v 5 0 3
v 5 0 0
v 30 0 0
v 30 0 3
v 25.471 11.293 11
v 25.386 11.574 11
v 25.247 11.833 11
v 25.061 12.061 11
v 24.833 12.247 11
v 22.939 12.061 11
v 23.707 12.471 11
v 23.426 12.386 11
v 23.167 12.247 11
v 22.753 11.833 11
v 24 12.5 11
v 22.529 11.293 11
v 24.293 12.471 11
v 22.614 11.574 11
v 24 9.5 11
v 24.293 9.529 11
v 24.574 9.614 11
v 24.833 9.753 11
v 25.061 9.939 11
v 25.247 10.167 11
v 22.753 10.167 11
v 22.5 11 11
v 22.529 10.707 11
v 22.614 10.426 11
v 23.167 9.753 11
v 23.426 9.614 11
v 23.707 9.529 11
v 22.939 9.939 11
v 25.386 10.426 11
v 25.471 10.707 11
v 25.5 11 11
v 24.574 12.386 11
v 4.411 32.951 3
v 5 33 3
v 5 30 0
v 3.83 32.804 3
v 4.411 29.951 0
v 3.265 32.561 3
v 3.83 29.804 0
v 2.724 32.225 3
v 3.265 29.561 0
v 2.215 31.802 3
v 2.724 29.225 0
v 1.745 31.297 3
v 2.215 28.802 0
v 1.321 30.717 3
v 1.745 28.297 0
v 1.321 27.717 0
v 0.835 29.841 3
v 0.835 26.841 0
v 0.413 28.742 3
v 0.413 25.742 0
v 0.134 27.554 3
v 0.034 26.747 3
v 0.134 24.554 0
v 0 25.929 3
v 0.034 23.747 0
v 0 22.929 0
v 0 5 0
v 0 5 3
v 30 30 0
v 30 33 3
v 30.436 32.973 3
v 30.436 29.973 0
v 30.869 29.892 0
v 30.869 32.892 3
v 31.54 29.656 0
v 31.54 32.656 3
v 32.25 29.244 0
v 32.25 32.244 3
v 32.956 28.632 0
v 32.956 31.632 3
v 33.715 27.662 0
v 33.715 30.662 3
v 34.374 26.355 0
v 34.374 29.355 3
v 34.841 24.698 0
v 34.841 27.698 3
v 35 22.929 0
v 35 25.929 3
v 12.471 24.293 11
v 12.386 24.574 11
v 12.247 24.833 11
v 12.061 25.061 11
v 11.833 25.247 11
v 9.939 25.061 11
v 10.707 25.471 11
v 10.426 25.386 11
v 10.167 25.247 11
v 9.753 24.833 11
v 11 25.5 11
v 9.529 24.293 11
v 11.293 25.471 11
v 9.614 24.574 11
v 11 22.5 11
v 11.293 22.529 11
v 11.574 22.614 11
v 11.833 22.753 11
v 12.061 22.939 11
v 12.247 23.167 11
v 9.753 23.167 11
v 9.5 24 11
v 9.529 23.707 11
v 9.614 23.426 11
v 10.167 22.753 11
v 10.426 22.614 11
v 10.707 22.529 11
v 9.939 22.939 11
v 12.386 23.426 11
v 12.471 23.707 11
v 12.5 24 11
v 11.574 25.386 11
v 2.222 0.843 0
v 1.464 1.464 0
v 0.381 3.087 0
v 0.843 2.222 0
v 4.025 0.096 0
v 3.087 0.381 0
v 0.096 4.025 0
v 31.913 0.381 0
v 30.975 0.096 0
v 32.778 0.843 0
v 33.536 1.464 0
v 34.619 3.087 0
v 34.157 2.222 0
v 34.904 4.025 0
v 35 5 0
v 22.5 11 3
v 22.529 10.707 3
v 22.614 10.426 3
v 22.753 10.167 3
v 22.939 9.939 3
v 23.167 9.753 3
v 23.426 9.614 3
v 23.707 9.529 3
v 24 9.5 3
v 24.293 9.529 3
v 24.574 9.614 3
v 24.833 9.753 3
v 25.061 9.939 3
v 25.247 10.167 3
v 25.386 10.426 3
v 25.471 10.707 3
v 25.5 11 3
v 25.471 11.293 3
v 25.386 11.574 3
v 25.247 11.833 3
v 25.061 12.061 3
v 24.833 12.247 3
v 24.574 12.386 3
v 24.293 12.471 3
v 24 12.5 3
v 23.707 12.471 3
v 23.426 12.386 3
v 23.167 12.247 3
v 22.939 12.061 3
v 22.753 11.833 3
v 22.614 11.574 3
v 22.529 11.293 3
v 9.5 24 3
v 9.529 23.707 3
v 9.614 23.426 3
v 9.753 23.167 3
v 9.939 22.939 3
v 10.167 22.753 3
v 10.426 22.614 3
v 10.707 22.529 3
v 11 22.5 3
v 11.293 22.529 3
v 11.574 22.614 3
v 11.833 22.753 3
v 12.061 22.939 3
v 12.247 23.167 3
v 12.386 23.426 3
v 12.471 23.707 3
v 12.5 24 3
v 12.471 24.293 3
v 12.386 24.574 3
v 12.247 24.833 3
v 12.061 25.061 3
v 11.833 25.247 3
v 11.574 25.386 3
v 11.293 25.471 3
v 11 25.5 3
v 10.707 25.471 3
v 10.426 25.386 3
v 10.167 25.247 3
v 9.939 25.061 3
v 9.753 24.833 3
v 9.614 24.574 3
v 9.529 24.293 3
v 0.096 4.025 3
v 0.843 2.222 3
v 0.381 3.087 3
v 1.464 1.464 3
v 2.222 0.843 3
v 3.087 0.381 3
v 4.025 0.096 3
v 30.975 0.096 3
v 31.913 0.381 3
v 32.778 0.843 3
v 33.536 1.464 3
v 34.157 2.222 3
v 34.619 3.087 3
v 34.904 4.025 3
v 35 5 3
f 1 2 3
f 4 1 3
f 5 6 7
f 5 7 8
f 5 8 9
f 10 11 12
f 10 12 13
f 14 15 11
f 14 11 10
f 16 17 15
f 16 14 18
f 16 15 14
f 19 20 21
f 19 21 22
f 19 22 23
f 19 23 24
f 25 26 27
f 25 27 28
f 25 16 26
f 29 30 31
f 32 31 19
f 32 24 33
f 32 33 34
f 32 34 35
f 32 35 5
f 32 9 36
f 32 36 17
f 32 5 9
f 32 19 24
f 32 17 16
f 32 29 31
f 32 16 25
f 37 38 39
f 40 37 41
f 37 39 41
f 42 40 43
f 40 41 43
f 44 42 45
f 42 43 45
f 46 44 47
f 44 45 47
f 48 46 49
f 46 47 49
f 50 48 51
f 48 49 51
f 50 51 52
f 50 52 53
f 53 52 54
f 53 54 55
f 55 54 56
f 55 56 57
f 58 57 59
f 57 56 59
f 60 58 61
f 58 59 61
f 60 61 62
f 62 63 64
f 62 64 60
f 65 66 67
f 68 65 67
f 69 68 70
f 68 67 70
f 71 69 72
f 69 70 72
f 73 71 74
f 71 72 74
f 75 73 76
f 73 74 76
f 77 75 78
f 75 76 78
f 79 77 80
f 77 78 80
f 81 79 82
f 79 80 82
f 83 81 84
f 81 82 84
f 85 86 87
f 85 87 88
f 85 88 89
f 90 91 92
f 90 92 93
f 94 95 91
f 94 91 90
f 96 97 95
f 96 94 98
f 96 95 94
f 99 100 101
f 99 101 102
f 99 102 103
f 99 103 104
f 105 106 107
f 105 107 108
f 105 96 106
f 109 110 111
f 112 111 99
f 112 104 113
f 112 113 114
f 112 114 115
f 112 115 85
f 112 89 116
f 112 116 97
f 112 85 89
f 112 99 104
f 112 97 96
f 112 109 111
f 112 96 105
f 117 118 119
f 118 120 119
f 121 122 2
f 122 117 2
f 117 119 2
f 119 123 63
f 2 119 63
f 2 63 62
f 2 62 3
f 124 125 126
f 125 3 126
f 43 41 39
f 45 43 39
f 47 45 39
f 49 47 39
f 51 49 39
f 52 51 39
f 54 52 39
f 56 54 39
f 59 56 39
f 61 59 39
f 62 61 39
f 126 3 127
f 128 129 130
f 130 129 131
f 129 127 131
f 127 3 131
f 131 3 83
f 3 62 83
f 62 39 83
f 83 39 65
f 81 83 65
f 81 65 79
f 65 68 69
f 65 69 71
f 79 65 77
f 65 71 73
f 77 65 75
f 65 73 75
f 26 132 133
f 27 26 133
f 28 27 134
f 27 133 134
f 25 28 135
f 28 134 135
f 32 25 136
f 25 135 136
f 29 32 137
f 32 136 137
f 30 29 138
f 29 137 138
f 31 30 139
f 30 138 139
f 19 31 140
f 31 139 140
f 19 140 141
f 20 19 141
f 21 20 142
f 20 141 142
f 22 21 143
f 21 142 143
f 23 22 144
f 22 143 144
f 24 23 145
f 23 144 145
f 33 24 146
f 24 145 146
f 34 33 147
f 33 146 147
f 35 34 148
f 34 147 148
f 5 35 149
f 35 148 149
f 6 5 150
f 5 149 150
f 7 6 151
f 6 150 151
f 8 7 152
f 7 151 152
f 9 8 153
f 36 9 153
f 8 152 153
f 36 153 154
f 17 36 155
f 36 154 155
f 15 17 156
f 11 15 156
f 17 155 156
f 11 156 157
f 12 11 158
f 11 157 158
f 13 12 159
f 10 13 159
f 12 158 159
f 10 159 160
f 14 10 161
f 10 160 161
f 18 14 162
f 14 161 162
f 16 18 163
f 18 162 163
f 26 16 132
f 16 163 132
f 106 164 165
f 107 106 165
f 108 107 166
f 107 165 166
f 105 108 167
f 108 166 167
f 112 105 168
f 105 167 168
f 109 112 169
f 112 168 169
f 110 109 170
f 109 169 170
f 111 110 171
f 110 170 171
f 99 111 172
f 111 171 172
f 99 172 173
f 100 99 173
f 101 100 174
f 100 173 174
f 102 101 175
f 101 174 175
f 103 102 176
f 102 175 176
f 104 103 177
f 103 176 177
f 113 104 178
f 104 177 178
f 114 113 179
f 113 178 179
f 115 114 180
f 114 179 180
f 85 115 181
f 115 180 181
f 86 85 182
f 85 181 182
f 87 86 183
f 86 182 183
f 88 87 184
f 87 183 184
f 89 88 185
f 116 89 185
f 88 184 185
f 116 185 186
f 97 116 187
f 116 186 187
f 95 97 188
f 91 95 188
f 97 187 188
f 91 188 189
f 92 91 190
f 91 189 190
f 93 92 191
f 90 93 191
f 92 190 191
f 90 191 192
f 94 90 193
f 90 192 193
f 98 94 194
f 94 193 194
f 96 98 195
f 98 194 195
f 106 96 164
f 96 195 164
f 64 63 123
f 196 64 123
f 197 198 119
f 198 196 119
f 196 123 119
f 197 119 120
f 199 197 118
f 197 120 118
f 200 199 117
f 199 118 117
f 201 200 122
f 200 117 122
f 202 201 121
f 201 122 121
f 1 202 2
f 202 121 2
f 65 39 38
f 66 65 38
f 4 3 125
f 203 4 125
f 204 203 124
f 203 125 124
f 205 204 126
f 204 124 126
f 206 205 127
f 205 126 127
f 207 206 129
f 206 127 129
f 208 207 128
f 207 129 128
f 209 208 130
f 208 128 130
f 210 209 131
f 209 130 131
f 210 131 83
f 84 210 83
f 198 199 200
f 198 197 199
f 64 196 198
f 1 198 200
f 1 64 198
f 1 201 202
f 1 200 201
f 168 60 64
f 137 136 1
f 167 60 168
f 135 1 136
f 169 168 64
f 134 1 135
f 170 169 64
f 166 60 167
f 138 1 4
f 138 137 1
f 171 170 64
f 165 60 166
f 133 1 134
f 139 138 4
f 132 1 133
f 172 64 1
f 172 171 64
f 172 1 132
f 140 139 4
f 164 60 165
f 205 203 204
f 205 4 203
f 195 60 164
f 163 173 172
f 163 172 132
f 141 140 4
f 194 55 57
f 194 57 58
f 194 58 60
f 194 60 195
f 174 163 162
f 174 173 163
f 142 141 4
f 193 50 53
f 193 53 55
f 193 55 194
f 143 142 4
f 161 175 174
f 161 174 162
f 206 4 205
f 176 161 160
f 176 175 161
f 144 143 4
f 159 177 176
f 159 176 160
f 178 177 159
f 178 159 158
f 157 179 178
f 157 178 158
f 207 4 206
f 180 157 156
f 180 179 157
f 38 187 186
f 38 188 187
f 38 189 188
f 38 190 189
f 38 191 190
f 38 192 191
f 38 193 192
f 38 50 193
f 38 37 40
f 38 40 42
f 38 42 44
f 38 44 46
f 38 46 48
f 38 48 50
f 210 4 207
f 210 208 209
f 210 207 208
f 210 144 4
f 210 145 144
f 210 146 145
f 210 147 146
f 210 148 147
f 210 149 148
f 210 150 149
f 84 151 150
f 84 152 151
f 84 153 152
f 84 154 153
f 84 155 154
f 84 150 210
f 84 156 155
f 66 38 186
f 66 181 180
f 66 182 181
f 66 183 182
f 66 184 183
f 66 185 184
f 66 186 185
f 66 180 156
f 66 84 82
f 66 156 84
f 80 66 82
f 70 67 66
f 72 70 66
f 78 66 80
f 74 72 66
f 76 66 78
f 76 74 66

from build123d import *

# Parameters (mm, degrees)
SKETCH1_W           = 35
SKETCH1_H           = 35
BOSS_EXTRUDE1_DEPTH = 3
SKETCH2_R           = 1.5
BOSS_EXTRUDE2_DEPTH = 8
CHAMFER1_SIZE       = 5
FILLET1_R           = 5


with BuildPart() as part:
    # Sketch1 → Boss-Extrude1 (new body)
    with BuildSketch(Plane.XY):
        with Locations((17.5, 17.5)):
            Rectangle(SKETCH1_W, SKETCH1_H)
    extrude(amount=BOSS_EXTRUDE1_DEPTH)

    # Sketch2 → Boss-Extrude2 (add)
    with BuildSketch(Plane.XY.offset(3)):
        with Locations(Location((11, 24, 0), (0, 0, 180))):
            Circle(SKETCH2_R)
        with Locations(Location((24, 11, 0), (0, 0, 180))):
            Circle(SKETCH2_R)
    extrude(amount=BOSS_EXTRUDE2_DEPTH)

    # Chamfer1
    # the kernel refuses this chamfer: 5 mm, written as the material it takes off along each edge
    with BuildSketch(Plane(origin=(47.85841494, 35, 0), x_dir=(0, -0.9996219169112968, -0.027495876610586372), z_dir=(-1, 0, 0))) as chamfer1_piece_1:
        Polygon((CHAMFER1_SIZE * 0.999621916911, CHAMFER1_SIZE * 0.0274958766106), (-CHAMFER1_SIZE * 0.0274958766106, CHAMFER1_SIZE * 0.999621916911), (0, 0), align=None)
    extrude(amount=60.71682988, mode=Mode.SUBTRACT)

    # Fillet1
    # the kernel refuses this fillet: 5 mm, written as the material it takes off along each edge
    with BuildSketch(Plane(origin=(0, 21.161165235, -8.838834765), x_dir=(0, -0.7071067811868302, 0.7071067811862648), z_dir=(0, 0.7071067811862648, 0.7071067811868302)), Plane(origin=(35, 41.838834765, 11.838834765), x_dir=(0, -0.7071067811868302, 0.7071067811862648), z_dir=(0, -0.7071067811862648, -0.7071067811868302))) as fillet1_piece_1:
        with BuildLine():
            CenterArc((FILLET1_R, FILLET1_R), FILLET1_R, 180, 90)
            Line((0, FILLET1_R), (0, 0))
            Line((0, 0), (FILLET1_R, 0))
        make_face()
    extrude(amount=29.242640687, mode=Mode.SUBTRACT)
    with BuildSketch(Plane(origin=(35, 0, -12.5), x_dir=(-1, 0, 0), z_dir=(0, 0, 1))) as fillet1_piece_2:
        with BuildLine():
            CenterArc((FILLET1_R, -FILLET1_R), FILLET1_R, 90, 90)
            Line((0, -FILLET1_R), (0, 0))
            Line((0, 0), (FILLET1_R, 0))
        make_face()
    extrude(amount=28, mode=Mode.SUBTRACT)
    with BuildSketch(Plane(origin=(0, 0, -12.5), x_dir=(1, 0, 0), z_dir=(0, 0, 1))) as fillet1_piece_3:
        with BuildLine():
            CenterArc((FILLET1_R, FILLET1_R), FILLET1_R, 180, 90)
            Line((0, FILLET1_R), (0, 0))
            Line((0, 0), (FILLET1_R, 0))
        make_face()
    extrude(amount=28, mode=Mode.SUBTRACT)


solid = part.part
